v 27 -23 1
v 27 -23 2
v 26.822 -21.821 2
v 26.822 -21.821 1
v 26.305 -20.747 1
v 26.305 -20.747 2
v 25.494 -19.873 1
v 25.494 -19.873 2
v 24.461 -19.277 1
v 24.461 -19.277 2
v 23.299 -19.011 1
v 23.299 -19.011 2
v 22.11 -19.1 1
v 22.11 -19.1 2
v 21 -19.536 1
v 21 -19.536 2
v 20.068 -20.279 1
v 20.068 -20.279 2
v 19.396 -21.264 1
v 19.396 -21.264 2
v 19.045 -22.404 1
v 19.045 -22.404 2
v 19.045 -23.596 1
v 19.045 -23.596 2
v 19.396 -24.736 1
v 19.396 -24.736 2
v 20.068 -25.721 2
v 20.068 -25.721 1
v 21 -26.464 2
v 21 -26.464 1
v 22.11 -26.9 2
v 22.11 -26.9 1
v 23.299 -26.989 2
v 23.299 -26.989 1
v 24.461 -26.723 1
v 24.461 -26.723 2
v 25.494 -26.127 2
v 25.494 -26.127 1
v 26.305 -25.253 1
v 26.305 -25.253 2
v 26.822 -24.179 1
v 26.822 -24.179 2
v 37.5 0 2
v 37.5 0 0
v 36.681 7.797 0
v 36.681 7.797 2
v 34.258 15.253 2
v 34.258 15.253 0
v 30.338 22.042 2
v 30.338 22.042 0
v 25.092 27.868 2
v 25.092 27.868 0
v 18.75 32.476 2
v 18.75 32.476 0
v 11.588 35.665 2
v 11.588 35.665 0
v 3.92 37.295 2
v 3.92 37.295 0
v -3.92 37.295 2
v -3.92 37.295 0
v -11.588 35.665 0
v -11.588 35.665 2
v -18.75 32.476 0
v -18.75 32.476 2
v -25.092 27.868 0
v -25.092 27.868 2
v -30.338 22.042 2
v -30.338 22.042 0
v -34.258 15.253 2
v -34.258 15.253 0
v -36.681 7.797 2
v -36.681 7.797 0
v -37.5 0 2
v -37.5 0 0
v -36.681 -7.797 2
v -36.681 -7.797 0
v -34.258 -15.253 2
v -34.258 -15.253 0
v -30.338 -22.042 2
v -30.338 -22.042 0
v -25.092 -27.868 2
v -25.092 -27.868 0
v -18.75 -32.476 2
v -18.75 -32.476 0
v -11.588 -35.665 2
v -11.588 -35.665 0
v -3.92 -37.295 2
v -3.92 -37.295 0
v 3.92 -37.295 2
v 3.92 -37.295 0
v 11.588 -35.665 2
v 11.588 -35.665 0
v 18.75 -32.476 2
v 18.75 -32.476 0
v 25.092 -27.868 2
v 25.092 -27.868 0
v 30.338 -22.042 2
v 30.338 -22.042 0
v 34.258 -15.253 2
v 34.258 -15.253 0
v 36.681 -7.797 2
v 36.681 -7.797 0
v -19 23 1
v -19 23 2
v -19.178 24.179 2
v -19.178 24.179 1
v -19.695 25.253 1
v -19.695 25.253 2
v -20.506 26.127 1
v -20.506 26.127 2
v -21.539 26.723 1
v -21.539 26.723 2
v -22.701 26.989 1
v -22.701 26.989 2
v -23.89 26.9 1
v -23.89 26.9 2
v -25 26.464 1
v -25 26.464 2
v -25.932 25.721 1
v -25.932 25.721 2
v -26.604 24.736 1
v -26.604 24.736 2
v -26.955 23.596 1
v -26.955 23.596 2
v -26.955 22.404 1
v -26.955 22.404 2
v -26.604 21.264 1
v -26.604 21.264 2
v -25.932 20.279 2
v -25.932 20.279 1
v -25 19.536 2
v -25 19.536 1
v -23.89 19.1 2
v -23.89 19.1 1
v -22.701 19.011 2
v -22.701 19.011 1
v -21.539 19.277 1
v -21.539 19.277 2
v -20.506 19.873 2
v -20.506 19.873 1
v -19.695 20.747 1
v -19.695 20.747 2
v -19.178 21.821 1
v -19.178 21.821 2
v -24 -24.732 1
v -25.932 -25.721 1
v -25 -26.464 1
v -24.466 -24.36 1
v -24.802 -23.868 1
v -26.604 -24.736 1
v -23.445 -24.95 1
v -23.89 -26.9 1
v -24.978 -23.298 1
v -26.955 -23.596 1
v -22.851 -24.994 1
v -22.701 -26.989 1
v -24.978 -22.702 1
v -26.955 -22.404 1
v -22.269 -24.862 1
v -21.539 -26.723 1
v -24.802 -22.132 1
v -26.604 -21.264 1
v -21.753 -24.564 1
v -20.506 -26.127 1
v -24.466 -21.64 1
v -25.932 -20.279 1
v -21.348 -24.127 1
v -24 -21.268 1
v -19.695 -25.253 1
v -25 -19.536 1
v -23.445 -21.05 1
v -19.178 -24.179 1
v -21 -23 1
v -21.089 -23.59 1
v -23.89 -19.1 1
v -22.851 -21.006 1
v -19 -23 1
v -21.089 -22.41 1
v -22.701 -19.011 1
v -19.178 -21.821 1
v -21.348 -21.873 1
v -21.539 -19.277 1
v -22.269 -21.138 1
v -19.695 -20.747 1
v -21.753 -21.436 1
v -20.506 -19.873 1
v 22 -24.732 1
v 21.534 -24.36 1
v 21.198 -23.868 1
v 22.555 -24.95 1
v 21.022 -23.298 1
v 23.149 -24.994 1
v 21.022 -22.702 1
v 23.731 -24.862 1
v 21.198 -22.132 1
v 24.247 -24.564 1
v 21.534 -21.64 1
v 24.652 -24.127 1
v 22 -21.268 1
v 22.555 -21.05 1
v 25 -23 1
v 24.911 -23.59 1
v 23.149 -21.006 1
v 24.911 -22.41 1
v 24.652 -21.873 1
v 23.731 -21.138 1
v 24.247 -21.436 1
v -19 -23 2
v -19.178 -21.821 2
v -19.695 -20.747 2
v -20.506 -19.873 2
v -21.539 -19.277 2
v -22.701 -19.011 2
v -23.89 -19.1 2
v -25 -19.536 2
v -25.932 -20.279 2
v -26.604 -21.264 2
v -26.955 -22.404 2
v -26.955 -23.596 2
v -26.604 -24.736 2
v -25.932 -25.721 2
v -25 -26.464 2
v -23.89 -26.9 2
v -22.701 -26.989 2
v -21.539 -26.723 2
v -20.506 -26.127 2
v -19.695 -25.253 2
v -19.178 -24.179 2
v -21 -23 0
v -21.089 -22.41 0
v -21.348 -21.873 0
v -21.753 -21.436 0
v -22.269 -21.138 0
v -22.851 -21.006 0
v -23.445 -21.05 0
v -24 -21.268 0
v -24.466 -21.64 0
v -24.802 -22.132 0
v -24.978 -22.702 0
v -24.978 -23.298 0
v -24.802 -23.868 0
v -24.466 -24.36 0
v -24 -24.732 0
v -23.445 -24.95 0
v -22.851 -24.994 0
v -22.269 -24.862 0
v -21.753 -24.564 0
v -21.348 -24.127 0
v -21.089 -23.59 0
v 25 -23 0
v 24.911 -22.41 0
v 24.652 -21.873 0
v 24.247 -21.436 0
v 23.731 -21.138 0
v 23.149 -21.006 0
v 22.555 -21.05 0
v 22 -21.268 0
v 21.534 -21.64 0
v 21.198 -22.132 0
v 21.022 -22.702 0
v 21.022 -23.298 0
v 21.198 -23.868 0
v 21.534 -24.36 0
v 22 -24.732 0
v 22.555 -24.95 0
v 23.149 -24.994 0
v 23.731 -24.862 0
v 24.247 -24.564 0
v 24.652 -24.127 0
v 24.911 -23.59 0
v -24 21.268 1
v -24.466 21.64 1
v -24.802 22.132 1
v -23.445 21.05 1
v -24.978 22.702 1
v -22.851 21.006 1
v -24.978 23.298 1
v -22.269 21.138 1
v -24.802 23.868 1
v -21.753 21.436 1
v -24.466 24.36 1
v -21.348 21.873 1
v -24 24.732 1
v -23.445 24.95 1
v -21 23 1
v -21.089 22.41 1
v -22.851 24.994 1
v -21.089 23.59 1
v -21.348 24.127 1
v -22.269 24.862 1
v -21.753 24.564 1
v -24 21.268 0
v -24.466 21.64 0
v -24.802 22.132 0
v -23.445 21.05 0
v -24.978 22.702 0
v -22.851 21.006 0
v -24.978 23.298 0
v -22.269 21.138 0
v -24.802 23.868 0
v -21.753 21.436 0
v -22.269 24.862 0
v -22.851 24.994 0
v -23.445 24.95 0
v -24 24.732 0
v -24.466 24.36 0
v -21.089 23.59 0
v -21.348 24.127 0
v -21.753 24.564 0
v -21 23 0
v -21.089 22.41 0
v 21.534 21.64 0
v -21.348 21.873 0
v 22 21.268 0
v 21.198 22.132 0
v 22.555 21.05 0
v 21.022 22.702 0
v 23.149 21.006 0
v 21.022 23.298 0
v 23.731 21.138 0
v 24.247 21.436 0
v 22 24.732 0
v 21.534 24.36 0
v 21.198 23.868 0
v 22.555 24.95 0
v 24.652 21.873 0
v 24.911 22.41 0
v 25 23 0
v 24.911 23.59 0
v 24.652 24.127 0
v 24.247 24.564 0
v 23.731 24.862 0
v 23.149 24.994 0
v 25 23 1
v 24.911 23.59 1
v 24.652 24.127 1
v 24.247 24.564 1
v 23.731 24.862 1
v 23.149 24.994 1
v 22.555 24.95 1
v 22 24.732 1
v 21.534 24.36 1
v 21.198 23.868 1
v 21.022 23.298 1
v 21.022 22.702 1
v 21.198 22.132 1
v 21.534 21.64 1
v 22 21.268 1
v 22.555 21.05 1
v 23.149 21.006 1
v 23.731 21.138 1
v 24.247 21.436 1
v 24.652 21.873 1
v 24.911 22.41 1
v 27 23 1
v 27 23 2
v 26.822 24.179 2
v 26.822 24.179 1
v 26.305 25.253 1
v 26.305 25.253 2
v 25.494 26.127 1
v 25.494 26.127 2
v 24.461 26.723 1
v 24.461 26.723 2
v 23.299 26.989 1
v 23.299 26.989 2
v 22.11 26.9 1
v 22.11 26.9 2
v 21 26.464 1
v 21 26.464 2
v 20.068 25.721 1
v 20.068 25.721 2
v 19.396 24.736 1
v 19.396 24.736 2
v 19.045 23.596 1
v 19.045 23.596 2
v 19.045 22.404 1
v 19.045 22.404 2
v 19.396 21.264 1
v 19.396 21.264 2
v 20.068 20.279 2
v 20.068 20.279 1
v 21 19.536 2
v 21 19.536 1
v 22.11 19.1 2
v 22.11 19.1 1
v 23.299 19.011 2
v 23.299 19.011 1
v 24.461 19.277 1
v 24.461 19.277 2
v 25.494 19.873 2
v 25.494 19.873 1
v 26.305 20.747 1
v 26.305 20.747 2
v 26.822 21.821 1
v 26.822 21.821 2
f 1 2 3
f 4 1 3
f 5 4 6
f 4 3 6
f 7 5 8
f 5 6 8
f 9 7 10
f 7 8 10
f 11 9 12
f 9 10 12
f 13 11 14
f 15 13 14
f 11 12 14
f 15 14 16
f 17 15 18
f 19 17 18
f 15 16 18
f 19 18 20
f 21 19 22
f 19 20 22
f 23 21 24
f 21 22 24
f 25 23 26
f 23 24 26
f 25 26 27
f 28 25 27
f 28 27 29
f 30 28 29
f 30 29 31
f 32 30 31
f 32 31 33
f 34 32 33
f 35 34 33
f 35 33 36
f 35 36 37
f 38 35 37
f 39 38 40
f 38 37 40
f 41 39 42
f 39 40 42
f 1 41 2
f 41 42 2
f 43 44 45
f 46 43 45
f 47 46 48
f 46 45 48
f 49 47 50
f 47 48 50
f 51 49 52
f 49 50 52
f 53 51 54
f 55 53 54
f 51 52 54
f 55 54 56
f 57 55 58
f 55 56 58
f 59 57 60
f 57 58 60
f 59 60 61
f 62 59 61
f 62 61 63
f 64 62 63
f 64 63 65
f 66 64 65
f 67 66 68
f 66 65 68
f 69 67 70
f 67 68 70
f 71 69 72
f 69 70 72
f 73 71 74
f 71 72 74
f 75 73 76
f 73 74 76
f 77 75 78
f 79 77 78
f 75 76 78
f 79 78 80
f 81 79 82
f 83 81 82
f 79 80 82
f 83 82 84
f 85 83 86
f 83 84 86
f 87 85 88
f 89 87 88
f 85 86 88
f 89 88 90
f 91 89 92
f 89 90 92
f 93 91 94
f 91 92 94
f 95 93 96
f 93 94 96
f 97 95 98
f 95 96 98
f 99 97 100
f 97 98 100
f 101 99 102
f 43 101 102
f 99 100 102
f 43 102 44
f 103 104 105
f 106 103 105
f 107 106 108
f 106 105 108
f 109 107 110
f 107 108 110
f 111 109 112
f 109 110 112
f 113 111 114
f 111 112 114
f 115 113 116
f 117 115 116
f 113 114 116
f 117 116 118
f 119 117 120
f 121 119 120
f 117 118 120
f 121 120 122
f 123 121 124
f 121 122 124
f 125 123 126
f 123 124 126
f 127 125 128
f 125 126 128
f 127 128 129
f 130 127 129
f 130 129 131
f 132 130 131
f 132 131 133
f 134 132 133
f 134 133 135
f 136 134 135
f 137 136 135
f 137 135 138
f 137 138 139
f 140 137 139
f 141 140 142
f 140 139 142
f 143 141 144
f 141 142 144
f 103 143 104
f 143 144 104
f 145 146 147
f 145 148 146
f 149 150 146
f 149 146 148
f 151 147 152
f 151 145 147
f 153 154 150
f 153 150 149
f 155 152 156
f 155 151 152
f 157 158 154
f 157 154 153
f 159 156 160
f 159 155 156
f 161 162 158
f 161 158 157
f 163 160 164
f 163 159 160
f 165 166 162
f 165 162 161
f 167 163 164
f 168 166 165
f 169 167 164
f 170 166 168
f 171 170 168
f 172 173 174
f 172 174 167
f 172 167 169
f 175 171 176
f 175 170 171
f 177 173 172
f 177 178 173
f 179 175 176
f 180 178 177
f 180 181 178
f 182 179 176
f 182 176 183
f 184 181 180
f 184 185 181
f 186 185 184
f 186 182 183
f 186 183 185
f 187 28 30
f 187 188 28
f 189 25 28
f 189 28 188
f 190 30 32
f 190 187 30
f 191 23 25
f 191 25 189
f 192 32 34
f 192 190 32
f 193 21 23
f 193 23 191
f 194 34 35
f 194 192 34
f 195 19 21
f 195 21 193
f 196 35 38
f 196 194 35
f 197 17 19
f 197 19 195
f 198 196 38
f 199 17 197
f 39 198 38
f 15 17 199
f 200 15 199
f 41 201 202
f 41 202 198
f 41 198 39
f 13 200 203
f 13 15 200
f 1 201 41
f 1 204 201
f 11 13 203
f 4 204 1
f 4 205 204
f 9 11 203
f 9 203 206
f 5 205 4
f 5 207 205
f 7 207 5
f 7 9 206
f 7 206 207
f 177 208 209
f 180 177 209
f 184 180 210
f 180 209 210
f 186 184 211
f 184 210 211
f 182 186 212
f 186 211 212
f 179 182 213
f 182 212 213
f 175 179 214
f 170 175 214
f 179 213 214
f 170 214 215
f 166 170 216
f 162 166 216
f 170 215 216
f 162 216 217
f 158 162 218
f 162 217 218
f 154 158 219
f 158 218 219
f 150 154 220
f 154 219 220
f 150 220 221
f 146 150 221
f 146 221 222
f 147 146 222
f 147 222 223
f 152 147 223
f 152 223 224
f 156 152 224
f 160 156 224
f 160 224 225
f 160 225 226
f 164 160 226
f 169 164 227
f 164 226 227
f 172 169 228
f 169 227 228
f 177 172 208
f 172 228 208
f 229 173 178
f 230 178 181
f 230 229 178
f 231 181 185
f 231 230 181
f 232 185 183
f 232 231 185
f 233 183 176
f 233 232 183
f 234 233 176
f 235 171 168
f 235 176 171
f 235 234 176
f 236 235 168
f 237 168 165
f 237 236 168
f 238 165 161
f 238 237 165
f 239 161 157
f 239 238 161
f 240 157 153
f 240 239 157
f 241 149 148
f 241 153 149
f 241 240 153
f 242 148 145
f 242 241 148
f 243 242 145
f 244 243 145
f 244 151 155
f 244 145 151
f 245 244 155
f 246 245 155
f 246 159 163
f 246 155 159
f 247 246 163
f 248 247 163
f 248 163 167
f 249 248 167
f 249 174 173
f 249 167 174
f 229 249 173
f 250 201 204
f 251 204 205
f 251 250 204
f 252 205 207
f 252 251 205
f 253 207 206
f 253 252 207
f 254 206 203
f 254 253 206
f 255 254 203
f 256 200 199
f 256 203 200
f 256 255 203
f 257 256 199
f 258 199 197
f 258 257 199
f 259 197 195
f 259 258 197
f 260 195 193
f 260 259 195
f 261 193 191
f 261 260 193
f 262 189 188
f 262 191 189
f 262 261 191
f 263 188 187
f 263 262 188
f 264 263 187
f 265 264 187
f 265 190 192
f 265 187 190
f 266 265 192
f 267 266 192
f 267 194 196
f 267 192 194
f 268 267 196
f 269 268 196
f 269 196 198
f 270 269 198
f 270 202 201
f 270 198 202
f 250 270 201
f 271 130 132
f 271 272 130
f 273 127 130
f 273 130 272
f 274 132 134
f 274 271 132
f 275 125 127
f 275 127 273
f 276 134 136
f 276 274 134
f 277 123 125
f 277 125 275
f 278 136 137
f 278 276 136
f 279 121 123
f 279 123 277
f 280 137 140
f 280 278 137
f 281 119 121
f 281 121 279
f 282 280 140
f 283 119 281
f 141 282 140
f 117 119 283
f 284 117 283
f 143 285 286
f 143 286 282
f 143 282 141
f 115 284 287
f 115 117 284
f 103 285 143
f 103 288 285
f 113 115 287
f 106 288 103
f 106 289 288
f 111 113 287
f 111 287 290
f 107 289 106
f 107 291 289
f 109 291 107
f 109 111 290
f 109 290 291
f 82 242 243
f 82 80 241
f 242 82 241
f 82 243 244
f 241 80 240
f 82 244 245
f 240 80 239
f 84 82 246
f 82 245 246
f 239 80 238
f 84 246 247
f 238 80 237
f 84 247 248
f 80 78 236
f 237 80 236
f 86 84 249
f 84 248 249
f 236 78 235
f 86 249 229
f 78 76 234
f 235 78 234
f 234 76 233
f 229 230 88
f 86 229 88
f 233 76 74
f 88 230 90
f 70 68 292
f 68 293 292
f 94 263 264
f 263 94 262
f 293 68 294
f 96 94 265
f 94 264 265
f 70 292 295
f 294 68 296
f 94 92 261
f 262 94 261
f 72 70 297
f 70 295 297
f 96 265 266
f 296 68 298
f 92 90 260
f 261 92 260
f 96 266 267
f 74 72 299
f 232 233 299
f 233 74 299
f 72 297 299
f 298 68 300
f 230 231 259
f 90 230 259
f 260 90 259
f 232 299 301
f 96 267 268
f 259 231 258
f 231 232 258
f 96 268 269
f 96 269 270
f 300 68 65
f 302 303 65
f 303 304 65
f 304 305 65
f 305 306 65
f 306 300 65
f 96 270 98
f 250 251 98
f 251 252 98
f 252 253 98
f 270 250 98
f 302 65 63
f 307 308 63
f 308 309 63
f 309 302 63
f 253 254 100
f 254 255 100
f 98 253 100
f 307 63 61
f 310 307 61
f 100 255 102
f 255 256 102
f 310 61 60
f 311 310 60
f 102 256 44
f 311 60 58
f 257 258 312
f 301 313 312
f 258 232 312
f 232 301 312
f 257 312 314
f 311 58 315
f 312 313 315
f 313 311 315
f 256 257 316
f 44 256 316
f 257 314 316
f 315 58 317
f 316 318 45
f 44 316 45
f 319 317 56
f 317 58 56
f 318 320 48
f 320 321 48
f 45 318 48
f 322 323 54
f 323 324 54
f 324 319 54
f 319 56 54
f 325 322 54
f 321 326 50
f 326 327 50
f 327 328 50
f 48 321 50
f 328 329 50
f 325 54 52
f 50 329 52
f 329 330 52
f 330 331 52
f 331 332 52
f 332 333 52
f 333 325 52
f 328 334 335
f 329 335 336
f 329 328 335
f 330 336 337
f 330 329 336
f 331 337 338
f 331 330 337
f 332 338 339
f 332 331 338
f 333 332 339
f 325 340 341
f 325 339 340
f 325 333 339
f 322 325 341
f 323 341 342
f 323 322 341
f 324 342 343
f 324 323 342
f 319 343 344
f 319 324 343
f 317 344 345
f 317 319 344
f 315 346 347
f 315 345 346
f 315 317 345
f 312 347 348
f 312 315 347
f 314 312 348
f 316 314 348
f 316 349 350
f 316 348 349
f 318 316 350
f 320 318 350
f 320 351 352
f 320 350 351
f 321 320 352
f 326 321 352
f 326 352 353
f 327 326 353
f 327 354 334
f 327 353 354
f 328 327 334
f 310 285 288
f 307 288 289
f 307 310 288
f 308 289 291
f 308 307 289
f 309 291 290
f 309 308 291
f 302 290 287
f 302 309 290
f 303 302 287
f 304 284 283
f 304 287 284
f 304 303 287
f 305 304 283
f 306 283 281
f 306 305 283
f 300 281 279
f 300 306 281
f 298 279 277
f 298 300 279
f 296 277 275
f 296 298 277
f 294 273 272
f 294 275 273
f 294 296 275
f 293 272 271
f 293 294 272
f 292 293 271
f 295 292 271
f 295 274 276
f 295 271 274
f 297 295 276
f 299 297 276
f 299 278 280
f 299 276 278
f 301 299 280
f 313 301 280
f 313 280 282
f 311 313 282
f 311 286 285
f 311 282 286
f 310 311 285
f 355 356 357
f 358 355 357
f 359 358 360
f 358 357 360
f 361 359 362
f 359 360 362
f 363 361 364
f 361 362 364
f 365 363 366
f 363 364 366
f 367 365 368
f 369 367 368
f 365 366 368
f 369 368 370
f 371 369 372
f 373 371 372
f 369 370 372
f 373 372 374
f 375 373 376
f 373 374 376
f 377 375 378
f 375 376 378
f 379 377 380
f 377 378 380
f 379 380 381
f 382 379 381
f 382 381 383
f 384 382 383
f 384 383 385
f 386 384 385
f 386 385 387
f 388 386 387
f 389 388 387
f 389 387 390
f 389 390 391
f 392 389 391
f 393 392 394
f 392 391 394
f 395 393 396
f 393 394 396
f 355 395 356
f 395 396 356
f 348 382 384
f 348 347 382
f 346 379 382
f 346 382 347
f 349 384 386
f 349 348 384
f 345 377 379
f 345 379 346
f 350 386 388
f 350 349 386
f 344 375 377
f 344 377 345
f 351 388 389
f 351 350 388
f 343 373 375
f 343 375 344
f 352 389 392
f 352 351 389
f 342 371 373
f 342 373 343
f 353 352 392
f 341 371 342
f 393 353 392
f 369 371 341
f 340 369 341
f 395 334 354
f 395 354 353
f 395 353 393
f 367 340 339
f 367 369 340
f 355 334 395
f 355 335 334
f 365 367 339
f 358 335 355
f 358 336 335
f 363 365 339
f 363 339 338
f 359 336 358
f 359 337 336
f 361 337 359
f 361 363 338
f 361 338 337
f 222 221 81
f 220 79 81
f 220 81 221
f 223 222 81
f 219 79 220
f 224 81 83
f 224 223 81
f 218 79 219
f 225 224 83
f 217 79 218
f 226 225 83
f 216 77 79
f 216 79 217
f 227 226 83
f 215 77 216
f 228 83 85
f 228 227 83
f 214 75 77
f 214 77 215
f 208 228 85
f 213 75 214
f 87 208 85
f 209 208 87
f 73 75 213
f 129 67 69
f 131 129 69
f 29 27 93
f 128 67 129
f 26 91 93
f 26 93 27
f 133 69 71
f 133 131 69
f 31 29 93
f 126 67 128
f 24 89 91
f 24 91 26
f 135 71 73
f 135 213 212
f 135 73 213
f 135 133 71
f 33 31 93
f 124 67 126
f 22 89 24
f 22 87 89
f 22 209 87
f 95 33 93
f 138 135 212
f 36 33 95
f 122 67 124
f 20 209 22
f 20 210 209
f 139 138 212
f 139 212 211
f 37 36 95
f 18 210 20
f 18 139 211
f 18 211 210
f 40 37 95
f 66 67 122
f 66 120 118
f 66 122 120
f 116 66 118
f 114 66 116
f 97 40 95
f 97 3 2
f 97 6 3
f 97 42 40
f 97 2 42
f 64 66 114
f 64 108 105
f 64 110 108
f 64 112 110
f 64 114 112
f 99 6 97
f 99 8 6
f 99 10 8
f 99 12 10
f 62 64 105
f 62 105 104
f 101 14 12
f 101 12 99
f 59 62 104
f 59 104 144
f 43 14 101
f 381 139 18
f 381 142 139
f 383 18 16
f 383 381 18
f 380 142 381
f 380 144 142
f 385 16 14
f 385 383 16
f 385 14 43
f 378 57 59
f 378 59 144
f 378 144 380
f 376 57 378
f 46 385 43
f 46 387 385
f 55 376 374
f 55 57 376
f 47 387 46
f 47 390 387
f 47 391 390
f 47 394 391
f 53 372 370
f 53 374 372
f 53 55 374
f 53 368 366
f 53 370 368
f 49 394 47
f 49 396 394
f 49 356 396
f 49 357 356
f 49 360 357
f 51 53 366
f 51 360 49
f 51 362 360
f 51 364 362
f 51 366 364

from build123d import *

# Parameters (mm, degrees)
F0_R     = 37.5
F0_R_2   = 2
F1_DEPTH = 2
F2_R     = 4
F3_DEPTH = 1


with BuildPart() as f1:
    # F0 (on Top) → F1 (new body)
    with BuildSketch(Plane.XY):
        Circle(F0_R)
        with Locations((-23, -23)):
            Circle(F0_R_2, mode=Mode.SUBTRACT)
        with Locations((23, -23)):
            Circle(F0_R_2, mode=Mode.SUBTRACT)
        with Locations((-23, 23)):
            Circle(F0_R_2, mode=Mode.SUBTRACT)
        with Locations((23, 23)):
            Circle(F0_R_2, mode=Mode.SUBTRACT)
    extrude(amount=F1_DEPTH)

    # F2 (on face) → F3 (cut)
    with BuildSketch(Plane.XY.offset(2)):
        with Locations((-23, 23)):
            Circle(F2_R)
        with Locations((23, 23)):
            Circle(F2_R)
        with Locations((-23, -23)):
            Circle(F2_R)
        with Locations((23, -23)):
            Circle(F2_R)
    extrude(amount=-F3_DEPTH, mode=Mode.SUBTRACT)


solid = f1.part
